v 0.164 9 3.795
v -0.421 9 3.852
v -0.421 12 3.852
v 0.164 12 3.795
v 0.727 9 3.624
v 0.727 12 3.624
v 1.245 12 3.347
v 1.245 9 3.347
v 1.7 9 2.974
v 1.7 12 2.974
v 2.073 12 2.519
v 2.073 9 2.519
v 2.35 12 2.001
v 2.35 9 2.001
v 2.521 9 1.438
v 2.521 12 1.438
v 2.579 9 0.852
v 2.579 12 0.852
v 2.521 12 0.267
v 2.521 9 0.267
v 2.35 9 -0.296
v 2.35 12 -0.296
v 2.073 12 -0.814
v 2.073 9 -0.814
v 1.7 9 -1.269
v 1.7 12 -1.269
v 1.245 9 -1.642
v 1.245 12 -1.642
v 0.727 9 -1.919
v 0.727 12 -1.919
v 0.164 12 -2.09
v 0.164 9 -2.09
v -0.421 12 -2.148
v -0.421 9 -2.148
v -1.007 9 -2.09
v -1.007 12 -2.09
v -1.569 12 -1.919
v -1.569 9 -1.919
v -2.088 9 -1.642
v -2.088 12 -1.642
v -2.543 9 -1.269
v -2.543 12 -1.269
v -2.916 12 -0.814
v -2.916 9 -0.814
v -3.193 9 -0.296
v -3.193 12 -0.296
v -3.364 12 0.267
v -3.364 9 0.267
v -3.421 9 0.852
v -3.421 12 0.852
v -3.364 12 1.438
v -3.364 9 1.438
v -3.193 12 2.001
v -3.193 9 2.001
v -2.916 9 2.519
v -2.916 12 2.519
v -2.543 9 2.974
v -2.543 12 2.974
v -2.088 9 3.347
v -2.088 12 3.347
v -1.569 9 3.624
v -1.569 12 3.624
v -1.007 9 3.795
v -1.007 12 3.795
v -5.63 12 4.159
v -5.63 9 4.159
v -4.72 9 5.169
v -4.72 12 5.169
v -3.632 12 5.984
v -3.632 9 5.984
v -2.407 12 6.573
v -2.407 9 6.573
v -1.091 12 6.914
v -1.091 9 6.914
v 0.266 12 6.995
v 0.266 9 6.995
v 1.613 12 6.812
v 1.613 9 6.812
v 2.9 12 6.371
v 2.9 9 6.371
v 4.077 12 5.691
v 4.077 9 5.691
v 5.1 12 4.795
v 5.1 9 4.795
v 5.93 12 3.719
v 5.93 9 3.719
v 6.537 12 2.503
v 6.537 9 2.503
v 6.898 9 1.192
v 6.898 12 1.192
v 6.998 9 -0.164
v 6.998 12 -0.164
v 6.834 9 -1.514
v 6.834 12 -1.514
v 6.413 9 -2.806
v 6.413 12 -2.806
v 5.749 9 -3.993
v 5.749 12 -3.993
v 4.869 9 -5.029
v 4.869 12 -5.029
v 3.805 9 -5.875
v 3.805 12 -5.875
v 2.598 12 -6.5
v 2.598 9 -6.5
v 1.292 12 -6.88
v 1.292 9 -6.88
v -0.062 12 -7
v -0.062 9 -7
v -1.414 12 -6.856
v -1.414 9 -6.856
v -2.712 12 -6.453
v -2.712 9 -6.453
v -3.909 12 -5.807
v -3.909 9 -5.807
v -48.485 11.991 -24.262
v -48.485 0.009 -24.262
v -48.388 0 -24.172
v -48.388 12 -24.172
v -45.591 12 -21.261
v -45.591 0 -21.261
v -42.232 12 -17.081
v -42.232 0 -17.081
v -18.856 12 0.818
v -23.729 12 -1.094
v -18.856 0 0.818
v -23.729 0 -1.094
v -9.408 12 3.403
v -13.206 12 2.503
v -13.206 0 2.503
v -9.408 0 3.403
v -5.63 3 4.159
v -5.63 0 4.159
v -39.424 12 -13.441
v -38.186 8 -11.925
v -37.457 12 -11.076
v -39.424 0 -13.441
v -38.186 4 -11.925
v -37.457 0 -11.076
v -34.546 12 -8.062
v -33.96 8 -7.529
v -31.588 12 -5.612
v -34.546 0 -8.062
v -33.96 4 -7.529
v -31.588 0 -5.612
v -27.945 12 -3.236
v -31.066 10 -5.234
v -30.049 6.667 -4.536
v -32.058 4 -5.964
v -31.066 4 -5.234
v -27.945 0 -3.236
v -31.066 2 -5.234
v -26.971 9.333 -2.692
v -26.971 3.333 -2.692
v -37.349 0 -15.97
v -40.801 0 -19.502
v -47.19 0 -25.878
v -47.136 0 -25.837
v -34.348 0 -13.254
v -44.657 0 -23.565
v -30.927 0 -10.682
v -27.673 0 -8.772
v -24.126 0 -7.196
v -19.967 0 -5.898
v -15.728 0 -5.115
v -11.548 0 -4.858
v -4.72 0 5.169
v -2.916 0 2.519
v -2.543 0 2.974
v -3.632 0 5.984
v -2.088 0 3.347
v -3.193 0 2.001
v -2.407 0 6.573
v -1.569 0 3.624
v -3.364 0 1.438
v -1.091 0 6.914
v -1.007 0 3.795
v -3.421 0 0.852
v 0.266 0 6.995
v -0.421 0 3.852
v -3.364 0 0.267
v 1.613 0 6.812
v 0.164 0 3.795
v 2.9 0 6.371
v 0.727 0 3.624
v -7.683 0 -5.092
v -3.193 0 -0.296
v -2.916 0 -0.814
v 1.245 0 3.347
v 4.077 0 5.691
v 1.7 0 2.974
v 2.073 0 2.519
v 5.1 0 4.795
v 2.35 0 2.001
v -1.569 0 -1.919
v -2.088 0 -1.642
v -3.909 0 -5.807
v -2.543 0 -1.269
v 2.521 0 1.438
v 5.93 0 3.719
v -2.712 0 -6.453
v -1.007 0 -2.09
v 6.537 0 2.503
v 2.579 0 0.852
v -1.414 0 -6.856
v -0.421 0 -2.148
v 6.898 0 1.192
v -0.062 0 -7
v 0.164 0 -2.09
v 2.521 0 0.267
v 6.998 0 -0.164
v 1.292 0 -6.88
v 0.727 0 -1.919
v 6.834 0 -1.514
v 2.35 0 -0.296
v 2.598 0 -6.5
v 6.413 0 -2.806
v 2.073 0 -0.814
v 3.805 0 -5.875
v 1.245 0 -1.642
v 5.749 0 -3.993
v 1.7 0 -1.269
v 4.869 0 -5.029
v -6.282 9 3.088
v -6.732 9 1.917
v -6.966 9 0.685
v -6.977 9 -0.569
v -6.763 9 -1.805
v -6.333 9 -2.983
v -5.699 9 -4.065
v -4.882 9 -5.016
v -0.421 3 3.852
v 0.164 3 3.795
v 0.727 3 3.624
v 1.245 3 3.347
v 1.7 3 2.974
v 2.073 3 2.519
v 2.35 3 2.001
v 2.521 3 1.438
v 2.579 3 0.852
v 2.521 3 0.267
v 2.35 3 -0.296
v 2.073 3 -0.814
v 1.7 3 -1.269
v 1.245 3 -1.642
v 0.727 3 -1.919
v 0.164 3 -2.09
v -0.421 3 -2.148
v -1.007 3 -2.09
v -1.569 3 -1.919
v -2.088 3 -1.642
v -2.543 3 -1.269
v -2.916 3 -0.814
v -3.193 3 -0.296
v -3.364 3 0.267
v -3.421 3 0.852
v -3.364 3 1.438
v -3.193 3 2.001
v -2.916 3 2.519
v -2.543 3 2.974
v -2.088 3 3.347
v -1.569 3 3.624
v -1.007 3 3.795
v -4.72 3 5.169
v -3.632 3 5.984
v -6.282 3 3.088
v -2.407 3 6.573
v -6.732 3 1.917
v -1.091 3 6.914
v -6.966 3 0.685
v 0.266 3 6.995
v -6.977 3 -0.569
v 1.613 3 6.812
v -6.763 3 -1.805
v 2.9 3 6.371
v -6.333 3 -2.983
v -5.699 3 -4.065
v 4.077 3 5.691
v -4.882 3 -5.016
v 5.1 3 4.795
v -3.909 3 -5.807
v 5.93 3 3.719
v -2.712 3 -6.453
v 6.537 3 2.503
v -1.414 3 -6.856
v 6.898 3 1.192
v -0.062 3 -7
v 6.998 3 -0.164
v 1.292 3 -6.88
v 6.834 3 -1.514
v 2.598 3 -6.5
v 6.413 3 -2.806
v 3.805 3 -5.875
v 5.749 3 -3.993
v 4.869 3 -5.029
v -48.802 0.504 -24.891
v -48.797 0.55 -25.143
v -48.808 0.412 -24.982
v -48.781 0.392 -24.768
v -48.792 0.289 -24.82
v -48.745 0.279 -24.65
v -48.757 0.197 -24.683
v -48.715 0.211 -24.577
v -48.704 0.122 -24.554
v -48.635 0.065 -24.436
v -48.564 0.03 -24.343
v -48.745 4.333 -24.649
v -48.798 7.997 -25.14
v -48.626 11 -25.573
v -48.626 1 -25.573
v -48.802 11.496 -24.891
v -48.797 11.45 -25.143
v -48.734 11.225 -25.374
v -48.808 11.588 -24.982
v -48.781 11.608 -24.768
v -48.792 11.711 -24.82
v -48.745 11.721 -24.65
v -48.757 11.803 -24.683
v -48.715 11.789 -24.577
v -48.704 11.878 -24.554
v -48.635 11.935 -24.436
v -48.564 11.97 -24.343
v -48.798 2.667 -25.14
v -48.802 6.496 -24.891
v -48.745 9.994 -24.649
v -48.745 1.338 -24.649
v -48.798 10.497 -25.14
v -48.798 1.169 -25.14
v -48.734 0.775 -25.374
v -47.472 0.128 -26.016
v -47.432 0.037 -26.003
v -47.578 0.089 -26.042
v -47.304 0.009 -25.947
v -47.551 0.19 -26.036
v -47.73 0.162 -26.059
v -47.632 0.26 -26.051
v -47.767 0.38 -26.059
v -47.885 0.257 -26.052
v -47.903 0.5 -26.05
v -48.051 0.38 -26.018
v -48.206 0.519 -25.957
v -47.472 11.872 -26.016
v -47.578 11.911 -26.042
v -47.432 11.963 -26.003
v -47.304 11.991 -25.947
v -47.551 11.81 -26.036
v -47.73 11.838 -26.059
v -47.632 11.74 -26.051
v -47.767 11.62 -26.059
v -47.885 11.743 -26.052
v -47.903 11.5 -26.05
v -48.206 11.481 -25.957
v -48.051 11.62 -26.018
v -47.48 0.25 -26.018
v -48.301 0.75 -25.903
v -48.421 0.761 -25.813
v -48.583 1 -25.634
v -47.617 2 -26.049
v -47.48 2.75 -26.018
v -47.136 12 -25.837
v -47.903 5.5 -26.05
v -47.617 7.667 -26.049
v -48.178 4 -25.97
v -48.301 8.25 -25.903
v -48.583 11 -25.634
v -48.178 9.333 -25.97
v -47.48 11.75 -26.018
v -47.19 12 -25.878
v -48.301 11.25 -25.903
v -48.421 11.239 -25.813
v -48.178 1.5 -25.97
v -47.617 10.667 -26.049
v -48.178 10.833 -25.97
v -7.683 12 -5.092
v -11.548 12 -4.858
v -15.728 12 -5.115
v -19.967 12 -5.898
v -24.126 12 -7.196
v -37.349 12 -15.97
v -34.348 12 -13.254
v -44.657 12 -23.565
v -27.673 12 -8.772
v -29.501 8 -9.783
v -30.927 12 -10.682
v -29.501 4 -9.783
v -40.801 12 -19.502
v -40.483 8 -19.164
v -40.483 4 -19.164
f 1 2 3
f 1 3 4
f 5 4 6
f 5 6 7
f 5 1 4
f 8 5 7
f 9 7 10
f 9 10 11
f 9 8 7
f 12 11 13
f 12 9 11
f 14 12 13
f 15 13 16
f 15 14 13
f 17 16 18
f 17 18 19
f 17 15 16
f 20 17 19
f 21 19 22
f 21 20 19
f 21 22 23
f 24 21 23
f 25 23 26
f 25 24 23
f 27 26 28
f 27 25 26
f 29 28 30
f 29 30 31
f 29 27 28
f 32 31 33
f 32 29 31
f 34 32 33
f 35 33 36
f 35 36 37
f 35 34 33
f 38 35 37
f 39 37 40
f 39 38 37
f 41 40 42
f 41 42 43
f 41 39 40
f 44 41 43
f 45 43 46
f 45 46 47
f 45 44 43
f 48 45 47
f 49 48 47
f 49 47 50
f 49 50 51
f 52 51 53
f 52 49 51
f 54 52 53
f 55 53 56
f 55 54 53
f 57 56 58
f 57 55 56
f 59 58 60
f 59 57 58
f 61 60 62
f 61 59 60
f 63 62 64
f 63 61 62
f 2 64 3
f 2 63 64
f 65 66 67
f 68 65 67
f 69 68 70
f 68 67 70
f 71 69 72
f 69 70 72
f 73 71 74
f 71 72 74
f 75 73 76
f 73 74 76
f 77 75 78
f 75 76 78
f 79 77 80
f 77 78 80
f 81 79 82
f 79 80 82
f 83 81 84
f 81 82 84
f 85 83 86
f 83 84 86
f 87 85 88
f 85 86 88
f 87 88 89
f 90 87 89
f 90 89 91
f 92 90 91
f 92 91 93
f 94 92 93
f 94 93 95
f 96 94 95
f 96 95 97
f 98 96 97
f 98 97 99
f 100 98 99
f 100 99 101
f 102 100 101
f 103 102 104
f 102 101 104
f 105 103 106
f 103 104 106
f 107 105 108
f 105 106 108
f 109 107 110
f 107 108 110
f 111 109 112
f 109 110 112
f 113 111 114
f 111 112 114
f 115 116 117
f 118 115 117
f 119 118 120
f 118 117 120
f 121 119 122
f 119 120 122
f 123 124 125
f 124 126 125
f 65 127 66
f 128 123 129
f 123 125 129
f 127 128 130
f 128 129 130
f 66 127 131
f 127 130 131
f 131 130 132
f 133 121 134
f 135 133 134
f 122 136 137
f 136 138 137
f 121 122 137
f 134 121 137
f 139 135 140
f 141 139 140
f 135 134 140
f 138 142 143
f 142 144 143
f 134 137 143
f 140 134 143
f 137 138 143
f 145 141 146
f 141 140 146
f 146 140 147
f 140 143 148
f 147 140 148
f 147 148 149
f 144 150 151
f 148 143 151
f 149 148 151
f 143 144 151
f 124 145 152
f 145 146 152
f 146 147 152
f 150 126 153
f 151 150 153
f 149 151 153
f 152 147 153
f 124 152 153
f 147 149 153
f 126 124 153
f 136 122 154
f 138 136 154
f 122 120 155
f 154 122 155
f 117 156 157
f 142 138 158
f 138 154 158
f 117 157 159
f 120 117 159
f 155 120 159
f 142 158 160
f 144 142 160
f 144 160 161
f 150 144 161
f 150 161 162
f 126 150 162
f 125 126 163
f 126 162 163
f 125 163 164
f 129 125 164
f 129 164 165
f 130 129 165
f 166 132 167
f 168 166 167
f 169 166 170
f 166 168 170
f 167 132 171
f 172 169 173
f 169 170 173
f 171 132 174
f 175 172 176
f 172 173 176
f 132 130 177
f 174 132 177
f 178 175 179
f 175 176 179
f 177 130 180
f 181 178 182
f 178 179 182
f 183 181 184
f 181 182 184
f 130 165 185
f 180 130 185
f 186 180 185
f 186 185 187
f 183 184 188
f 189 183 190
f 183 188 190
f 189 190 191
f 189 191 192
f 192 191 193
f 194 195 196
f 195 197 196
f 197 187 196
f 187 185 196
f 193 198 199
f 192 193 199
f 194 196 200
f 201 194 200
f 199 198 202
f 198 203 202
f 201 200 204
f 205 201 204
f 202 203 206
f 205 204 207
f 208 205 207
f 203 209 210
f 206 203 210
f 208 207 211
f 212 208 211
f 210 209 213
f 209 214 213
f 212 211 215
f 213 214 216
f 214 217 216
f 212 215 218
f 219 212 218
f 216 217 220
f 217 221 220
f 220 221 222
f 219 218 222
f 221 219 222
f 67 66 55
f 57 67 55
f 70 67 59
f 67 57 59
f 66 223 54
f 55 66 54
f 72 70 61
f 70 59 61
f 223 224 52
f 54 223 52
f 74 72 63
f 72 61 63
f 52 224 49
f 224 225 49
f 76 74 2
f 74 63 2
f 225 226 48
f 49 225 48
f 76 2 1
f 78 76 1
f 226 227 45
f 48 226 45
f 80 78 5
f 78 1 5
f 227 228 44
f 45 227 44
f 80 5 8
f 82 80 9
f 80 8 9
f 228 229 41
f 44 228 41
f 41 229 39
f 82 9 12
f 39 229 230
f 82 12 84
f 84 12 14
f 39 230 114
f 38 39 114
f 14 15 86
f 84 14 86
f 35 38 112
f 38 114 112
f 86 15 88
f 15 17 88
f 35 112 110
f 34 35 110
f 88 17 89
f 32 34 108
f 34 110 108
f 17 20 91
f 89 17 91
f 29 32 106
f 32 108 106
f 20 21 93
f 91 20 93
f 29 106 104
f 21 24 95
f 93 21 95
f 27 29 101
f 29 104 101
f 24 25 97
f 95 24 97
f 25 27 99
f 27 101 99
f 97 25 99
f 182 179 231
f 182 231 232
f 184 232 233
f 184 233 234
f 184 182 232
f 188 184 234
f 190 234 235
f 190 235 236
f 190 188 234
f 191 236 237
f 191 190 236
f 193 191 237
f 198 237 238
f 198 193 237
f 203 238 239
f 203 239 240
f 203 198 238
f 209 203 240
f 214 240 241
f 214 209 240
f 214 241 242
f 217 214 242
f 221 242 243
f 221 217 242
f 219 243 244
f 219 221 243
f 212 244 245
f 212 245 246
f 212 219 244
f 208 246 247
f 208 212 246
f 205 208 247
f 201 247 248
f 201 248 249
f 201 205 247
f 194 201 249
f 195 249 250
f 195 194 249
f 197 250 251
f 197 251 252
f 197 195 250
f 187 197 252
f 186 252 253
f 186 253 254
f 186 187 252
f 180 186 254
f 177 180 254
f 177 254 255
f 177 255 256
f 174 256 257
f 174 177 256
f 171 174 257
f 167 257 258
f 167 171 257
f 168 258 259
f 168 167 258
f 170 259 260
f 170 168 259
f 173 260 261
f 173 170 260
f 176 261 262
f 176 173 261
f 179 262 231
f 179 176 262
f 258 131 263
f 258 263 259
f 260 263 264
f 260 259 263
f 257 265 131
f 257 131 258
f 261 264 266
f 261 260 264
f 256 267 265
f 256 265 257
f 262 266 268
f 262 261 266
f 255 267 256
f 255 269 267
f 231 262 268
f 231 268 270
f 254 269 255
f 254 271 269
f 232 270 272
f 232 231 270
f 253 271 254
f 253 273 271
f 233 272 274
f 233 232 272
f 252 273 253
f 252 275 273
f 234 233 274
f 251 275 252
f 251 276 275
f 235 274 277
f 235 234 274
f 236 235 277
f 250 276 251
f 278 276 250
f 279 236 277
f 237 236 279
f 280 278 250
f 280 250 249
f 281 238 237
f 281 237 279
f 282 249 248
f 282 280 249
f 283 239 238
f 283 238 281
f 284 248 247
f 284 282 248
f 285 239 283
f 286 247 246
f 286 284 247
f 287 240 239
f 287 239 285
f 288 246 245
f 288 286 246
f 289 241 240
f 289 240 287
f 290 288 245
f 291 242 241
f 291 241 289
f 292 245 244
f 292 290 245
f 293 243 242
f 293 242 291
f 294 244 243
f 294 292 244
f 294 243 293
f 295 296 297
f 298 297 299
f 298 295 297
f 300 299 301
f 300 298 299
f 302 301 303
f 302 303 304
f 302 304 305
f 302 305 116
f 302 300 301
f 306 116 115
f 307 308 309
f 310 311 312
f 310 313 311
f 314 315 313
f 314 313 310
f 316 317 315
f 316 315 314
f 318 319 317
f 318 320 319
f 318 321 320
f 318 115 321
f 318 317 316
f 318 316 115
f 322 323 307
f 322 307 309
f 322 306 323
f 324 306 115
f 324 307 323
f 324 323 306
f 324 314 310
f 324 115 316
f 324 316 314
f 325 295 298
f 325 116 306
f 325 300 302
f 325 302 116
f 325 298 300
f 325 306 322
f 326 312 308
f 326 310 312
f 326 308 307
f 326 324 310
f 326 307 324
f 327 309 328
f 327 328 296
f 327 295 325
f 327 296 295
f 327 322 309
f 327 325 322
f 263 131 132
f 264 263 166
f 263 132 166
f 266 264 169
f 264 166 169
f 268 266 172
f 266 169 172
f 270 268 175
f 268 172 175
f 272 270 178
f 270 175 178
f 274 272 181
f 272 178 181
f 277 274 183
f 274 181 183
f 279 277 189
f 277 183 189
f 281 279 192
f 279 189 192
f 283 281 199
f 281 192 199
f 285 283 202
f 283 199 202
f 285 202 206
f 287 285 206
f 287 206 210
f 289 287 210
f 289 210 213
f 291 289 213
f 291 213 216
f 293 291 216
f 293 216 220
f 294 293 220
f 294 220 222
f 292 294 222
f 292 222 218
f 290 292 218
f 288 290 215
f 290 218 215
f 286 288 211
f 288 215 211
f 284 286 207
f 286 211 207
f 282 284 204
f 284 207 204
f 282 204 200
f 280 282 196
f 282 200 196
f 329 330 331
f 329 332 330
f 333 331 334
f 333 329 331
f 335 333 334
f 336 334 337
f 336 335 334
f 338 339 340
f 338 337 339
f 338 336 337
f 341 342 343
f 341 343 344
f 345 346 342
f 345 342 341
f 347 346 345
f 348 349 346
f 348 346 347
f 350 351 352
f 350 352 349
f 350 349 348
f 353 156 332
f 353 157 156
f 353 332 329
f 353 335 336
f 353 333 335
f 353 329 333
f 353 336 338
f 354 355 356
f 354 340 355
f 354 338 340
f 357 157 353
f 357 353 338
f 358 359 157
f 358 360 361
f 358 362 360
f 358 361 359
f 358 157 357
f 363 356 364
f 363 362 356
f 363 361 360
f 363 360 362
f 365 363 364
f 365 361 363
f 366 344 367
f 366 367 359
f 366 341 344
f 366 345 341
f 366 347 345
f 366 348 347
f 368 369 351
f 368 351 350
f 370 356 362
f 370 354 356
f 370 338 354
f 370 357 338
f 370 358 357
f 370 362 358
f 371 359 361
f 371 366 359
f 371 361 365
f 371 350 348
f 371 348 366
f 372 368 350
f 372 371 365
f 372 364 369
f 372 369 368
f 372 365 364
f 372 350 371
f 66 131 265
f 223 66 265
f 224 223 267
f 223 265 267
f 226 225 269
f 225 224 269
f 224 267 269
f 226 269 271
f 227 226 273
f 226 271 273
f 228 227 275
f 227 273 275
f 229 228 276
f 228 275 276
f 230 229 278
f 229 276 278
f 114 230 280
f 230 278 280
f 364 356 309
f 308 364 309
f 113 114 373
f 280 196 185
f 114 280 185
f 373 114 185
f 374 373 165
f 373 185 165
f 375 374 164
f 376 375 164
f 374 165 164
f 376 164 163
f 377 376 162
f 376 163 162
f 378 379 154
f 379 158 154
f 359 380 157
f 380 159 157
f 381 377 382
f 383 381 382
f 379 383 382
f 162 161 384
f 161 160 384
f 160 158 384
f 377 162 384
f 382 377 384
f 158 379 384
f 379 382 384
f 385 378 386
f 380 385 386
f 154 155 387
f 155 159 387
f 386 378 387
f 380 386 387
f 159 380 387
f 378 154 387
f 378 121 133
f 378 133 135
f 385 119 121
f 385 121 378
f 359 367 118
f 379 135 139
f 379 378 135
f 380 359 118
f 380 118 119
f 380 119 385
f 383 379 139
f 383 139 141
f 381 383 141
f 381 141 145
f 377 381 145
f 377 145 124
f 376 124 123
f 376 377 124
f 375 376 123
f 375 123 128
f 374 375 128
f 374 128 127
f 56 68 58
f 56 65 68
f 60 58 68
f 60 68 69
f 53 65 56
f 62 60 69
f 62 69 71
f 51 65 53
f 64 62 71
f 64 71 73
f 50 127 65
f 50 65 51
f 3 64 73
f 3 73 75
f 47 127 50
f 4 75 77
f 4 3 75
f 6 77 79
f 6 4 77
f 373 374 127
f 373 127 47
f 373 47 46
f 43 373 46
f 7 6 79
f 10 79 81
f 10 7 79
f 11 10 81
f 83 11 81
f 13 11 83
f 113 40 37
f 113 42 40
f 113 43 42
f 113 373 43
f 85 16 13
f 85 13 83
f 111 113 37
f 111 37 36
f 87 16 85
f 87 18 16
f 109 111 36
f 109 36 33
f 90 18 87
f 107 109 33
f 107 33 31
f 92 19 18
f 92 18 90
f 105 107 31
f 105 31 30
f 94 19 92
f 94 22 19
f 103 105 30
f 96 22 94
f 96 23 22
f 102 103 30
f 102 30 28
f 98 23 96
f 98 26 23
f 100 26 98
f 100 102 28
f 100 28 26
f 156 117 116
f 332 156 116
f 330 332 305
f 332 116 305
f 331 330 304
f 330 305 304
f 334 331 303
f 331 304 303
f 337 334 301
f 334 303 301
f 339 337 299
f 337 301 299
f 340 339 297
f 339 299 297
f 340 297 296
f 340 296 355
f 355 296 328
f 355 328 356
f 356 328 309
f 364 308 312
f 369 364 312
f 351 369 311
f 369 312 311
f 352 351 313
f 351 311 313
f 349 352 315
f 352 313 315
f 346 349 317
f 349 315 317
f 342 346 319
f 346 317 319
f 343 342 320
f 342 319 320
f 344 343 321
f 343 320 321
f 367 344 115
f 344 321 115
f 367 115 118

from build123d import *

# Parameters (mm, degrees)
EXTRUDE_1_DEPTH = 12
SKETCH_1_3_R    = 7
SKETCH_1_3_R_2  = 3
EXTRUDE_2_DEPTH = 3
EXTRUDE_START   = 9
SKETCH_1_4_R    = 7
SKETCH_1_4_R_2  = 3
EXTRUDE_3_DEPTH = 3
FILLET_1_R      = 1


with BuildPart() as part:
    # 草图1 → 凸台-拉伸1 (new body)
    with BuildSketch(Plane(origin=(0, 0, 0), x_dir=(1, 0, 0), z_dir=(0, 1, 0))):
        with BuildLine():
            add(Edge.make_bspline(
                [(-3.908610404, 5.807130506), (-12.380011049, 3.605621884), (-27.376579438, 6.317559199), (-39.425413051, 17.773045339), (-45.658717555, 24.846396214), (-47.987295244, 26.48198888)],
                knots=[0, 0, 0, 0, 0.514096191, 0.795654463, 1, 1, 1, 1], degree=3))
            Line((-47.987295244, 26.48198888), (-49.136854466, 24.845372371))
            add(Edge.make_bspline(
                [(-49.136854466, 24.845372371), (-44.808882779, 21.086502798), (-40.758819083, 14.514483032), (-28.442702771, 1.362936195), (-15.62875807, -2.307960271), (-5.630384559, -4.159178971)],
                knots=[0, 0, 0, 0, 0.315330411, 0.428800605, 1, 1, 1, 1], degree=3))
            ThreePointArc((-5.630384559, -4.159178971), (-6.897821205, 1.191663806), (-3.908610404, 5.807130506))
        make_face()
    extrude(amount=EXTRUDE_1_DEPTH)

    # 草图1<3> → 凸台-拉伸2 (add)
    with BuildSketch(Plane(origin=(0, 0, 0), x_dir=(1, 0, 0), z_dir=(0, 1, 0))):
        Circle(SKETCH_1_3_R)
        with Locations(Location((-0.421324482, -0.852481629, 0), (0, 0, 270))):
            Circle(SKETCH_1_3_R_2, mode=Mode.SUBTRACT)
    extrude(amount=EXTRUDE_2_DEPTH)

    # 草图1<4> → 凸台-拉伸3 (add)
    with BuildSketch(Plane(origin=(0, 0, 0), x_dir=(1, 0, 0), z_dir=(0, 1, 0)).offset(EXTRUDE_START)):
        Circle(SKETCH_1_4_R)
        with Locations(Location((-0.421324482, -0.852481629, 0), (0, 0, 270))):
            Circle(SKETCH_1_4_R_2, mode=Mode.SUBTRACT)
    extrude(amount=EXTRUDE_3_DEPTH)

    # 圆角1
    fillet_1_edges = [part.edges().sort_by_distance(p)[0] for p in [
        (-47.987295244, 6, -26.48198888),
        (-48.562074855, 0, -25.663680626),
        (-48.562074855, 12, -25.663680626),
        (-49.136854466, 6, -24.845372371),
    ]]
    fillet(fillet_1_edges, radius=FILLET_1_R)


solid = part.part
